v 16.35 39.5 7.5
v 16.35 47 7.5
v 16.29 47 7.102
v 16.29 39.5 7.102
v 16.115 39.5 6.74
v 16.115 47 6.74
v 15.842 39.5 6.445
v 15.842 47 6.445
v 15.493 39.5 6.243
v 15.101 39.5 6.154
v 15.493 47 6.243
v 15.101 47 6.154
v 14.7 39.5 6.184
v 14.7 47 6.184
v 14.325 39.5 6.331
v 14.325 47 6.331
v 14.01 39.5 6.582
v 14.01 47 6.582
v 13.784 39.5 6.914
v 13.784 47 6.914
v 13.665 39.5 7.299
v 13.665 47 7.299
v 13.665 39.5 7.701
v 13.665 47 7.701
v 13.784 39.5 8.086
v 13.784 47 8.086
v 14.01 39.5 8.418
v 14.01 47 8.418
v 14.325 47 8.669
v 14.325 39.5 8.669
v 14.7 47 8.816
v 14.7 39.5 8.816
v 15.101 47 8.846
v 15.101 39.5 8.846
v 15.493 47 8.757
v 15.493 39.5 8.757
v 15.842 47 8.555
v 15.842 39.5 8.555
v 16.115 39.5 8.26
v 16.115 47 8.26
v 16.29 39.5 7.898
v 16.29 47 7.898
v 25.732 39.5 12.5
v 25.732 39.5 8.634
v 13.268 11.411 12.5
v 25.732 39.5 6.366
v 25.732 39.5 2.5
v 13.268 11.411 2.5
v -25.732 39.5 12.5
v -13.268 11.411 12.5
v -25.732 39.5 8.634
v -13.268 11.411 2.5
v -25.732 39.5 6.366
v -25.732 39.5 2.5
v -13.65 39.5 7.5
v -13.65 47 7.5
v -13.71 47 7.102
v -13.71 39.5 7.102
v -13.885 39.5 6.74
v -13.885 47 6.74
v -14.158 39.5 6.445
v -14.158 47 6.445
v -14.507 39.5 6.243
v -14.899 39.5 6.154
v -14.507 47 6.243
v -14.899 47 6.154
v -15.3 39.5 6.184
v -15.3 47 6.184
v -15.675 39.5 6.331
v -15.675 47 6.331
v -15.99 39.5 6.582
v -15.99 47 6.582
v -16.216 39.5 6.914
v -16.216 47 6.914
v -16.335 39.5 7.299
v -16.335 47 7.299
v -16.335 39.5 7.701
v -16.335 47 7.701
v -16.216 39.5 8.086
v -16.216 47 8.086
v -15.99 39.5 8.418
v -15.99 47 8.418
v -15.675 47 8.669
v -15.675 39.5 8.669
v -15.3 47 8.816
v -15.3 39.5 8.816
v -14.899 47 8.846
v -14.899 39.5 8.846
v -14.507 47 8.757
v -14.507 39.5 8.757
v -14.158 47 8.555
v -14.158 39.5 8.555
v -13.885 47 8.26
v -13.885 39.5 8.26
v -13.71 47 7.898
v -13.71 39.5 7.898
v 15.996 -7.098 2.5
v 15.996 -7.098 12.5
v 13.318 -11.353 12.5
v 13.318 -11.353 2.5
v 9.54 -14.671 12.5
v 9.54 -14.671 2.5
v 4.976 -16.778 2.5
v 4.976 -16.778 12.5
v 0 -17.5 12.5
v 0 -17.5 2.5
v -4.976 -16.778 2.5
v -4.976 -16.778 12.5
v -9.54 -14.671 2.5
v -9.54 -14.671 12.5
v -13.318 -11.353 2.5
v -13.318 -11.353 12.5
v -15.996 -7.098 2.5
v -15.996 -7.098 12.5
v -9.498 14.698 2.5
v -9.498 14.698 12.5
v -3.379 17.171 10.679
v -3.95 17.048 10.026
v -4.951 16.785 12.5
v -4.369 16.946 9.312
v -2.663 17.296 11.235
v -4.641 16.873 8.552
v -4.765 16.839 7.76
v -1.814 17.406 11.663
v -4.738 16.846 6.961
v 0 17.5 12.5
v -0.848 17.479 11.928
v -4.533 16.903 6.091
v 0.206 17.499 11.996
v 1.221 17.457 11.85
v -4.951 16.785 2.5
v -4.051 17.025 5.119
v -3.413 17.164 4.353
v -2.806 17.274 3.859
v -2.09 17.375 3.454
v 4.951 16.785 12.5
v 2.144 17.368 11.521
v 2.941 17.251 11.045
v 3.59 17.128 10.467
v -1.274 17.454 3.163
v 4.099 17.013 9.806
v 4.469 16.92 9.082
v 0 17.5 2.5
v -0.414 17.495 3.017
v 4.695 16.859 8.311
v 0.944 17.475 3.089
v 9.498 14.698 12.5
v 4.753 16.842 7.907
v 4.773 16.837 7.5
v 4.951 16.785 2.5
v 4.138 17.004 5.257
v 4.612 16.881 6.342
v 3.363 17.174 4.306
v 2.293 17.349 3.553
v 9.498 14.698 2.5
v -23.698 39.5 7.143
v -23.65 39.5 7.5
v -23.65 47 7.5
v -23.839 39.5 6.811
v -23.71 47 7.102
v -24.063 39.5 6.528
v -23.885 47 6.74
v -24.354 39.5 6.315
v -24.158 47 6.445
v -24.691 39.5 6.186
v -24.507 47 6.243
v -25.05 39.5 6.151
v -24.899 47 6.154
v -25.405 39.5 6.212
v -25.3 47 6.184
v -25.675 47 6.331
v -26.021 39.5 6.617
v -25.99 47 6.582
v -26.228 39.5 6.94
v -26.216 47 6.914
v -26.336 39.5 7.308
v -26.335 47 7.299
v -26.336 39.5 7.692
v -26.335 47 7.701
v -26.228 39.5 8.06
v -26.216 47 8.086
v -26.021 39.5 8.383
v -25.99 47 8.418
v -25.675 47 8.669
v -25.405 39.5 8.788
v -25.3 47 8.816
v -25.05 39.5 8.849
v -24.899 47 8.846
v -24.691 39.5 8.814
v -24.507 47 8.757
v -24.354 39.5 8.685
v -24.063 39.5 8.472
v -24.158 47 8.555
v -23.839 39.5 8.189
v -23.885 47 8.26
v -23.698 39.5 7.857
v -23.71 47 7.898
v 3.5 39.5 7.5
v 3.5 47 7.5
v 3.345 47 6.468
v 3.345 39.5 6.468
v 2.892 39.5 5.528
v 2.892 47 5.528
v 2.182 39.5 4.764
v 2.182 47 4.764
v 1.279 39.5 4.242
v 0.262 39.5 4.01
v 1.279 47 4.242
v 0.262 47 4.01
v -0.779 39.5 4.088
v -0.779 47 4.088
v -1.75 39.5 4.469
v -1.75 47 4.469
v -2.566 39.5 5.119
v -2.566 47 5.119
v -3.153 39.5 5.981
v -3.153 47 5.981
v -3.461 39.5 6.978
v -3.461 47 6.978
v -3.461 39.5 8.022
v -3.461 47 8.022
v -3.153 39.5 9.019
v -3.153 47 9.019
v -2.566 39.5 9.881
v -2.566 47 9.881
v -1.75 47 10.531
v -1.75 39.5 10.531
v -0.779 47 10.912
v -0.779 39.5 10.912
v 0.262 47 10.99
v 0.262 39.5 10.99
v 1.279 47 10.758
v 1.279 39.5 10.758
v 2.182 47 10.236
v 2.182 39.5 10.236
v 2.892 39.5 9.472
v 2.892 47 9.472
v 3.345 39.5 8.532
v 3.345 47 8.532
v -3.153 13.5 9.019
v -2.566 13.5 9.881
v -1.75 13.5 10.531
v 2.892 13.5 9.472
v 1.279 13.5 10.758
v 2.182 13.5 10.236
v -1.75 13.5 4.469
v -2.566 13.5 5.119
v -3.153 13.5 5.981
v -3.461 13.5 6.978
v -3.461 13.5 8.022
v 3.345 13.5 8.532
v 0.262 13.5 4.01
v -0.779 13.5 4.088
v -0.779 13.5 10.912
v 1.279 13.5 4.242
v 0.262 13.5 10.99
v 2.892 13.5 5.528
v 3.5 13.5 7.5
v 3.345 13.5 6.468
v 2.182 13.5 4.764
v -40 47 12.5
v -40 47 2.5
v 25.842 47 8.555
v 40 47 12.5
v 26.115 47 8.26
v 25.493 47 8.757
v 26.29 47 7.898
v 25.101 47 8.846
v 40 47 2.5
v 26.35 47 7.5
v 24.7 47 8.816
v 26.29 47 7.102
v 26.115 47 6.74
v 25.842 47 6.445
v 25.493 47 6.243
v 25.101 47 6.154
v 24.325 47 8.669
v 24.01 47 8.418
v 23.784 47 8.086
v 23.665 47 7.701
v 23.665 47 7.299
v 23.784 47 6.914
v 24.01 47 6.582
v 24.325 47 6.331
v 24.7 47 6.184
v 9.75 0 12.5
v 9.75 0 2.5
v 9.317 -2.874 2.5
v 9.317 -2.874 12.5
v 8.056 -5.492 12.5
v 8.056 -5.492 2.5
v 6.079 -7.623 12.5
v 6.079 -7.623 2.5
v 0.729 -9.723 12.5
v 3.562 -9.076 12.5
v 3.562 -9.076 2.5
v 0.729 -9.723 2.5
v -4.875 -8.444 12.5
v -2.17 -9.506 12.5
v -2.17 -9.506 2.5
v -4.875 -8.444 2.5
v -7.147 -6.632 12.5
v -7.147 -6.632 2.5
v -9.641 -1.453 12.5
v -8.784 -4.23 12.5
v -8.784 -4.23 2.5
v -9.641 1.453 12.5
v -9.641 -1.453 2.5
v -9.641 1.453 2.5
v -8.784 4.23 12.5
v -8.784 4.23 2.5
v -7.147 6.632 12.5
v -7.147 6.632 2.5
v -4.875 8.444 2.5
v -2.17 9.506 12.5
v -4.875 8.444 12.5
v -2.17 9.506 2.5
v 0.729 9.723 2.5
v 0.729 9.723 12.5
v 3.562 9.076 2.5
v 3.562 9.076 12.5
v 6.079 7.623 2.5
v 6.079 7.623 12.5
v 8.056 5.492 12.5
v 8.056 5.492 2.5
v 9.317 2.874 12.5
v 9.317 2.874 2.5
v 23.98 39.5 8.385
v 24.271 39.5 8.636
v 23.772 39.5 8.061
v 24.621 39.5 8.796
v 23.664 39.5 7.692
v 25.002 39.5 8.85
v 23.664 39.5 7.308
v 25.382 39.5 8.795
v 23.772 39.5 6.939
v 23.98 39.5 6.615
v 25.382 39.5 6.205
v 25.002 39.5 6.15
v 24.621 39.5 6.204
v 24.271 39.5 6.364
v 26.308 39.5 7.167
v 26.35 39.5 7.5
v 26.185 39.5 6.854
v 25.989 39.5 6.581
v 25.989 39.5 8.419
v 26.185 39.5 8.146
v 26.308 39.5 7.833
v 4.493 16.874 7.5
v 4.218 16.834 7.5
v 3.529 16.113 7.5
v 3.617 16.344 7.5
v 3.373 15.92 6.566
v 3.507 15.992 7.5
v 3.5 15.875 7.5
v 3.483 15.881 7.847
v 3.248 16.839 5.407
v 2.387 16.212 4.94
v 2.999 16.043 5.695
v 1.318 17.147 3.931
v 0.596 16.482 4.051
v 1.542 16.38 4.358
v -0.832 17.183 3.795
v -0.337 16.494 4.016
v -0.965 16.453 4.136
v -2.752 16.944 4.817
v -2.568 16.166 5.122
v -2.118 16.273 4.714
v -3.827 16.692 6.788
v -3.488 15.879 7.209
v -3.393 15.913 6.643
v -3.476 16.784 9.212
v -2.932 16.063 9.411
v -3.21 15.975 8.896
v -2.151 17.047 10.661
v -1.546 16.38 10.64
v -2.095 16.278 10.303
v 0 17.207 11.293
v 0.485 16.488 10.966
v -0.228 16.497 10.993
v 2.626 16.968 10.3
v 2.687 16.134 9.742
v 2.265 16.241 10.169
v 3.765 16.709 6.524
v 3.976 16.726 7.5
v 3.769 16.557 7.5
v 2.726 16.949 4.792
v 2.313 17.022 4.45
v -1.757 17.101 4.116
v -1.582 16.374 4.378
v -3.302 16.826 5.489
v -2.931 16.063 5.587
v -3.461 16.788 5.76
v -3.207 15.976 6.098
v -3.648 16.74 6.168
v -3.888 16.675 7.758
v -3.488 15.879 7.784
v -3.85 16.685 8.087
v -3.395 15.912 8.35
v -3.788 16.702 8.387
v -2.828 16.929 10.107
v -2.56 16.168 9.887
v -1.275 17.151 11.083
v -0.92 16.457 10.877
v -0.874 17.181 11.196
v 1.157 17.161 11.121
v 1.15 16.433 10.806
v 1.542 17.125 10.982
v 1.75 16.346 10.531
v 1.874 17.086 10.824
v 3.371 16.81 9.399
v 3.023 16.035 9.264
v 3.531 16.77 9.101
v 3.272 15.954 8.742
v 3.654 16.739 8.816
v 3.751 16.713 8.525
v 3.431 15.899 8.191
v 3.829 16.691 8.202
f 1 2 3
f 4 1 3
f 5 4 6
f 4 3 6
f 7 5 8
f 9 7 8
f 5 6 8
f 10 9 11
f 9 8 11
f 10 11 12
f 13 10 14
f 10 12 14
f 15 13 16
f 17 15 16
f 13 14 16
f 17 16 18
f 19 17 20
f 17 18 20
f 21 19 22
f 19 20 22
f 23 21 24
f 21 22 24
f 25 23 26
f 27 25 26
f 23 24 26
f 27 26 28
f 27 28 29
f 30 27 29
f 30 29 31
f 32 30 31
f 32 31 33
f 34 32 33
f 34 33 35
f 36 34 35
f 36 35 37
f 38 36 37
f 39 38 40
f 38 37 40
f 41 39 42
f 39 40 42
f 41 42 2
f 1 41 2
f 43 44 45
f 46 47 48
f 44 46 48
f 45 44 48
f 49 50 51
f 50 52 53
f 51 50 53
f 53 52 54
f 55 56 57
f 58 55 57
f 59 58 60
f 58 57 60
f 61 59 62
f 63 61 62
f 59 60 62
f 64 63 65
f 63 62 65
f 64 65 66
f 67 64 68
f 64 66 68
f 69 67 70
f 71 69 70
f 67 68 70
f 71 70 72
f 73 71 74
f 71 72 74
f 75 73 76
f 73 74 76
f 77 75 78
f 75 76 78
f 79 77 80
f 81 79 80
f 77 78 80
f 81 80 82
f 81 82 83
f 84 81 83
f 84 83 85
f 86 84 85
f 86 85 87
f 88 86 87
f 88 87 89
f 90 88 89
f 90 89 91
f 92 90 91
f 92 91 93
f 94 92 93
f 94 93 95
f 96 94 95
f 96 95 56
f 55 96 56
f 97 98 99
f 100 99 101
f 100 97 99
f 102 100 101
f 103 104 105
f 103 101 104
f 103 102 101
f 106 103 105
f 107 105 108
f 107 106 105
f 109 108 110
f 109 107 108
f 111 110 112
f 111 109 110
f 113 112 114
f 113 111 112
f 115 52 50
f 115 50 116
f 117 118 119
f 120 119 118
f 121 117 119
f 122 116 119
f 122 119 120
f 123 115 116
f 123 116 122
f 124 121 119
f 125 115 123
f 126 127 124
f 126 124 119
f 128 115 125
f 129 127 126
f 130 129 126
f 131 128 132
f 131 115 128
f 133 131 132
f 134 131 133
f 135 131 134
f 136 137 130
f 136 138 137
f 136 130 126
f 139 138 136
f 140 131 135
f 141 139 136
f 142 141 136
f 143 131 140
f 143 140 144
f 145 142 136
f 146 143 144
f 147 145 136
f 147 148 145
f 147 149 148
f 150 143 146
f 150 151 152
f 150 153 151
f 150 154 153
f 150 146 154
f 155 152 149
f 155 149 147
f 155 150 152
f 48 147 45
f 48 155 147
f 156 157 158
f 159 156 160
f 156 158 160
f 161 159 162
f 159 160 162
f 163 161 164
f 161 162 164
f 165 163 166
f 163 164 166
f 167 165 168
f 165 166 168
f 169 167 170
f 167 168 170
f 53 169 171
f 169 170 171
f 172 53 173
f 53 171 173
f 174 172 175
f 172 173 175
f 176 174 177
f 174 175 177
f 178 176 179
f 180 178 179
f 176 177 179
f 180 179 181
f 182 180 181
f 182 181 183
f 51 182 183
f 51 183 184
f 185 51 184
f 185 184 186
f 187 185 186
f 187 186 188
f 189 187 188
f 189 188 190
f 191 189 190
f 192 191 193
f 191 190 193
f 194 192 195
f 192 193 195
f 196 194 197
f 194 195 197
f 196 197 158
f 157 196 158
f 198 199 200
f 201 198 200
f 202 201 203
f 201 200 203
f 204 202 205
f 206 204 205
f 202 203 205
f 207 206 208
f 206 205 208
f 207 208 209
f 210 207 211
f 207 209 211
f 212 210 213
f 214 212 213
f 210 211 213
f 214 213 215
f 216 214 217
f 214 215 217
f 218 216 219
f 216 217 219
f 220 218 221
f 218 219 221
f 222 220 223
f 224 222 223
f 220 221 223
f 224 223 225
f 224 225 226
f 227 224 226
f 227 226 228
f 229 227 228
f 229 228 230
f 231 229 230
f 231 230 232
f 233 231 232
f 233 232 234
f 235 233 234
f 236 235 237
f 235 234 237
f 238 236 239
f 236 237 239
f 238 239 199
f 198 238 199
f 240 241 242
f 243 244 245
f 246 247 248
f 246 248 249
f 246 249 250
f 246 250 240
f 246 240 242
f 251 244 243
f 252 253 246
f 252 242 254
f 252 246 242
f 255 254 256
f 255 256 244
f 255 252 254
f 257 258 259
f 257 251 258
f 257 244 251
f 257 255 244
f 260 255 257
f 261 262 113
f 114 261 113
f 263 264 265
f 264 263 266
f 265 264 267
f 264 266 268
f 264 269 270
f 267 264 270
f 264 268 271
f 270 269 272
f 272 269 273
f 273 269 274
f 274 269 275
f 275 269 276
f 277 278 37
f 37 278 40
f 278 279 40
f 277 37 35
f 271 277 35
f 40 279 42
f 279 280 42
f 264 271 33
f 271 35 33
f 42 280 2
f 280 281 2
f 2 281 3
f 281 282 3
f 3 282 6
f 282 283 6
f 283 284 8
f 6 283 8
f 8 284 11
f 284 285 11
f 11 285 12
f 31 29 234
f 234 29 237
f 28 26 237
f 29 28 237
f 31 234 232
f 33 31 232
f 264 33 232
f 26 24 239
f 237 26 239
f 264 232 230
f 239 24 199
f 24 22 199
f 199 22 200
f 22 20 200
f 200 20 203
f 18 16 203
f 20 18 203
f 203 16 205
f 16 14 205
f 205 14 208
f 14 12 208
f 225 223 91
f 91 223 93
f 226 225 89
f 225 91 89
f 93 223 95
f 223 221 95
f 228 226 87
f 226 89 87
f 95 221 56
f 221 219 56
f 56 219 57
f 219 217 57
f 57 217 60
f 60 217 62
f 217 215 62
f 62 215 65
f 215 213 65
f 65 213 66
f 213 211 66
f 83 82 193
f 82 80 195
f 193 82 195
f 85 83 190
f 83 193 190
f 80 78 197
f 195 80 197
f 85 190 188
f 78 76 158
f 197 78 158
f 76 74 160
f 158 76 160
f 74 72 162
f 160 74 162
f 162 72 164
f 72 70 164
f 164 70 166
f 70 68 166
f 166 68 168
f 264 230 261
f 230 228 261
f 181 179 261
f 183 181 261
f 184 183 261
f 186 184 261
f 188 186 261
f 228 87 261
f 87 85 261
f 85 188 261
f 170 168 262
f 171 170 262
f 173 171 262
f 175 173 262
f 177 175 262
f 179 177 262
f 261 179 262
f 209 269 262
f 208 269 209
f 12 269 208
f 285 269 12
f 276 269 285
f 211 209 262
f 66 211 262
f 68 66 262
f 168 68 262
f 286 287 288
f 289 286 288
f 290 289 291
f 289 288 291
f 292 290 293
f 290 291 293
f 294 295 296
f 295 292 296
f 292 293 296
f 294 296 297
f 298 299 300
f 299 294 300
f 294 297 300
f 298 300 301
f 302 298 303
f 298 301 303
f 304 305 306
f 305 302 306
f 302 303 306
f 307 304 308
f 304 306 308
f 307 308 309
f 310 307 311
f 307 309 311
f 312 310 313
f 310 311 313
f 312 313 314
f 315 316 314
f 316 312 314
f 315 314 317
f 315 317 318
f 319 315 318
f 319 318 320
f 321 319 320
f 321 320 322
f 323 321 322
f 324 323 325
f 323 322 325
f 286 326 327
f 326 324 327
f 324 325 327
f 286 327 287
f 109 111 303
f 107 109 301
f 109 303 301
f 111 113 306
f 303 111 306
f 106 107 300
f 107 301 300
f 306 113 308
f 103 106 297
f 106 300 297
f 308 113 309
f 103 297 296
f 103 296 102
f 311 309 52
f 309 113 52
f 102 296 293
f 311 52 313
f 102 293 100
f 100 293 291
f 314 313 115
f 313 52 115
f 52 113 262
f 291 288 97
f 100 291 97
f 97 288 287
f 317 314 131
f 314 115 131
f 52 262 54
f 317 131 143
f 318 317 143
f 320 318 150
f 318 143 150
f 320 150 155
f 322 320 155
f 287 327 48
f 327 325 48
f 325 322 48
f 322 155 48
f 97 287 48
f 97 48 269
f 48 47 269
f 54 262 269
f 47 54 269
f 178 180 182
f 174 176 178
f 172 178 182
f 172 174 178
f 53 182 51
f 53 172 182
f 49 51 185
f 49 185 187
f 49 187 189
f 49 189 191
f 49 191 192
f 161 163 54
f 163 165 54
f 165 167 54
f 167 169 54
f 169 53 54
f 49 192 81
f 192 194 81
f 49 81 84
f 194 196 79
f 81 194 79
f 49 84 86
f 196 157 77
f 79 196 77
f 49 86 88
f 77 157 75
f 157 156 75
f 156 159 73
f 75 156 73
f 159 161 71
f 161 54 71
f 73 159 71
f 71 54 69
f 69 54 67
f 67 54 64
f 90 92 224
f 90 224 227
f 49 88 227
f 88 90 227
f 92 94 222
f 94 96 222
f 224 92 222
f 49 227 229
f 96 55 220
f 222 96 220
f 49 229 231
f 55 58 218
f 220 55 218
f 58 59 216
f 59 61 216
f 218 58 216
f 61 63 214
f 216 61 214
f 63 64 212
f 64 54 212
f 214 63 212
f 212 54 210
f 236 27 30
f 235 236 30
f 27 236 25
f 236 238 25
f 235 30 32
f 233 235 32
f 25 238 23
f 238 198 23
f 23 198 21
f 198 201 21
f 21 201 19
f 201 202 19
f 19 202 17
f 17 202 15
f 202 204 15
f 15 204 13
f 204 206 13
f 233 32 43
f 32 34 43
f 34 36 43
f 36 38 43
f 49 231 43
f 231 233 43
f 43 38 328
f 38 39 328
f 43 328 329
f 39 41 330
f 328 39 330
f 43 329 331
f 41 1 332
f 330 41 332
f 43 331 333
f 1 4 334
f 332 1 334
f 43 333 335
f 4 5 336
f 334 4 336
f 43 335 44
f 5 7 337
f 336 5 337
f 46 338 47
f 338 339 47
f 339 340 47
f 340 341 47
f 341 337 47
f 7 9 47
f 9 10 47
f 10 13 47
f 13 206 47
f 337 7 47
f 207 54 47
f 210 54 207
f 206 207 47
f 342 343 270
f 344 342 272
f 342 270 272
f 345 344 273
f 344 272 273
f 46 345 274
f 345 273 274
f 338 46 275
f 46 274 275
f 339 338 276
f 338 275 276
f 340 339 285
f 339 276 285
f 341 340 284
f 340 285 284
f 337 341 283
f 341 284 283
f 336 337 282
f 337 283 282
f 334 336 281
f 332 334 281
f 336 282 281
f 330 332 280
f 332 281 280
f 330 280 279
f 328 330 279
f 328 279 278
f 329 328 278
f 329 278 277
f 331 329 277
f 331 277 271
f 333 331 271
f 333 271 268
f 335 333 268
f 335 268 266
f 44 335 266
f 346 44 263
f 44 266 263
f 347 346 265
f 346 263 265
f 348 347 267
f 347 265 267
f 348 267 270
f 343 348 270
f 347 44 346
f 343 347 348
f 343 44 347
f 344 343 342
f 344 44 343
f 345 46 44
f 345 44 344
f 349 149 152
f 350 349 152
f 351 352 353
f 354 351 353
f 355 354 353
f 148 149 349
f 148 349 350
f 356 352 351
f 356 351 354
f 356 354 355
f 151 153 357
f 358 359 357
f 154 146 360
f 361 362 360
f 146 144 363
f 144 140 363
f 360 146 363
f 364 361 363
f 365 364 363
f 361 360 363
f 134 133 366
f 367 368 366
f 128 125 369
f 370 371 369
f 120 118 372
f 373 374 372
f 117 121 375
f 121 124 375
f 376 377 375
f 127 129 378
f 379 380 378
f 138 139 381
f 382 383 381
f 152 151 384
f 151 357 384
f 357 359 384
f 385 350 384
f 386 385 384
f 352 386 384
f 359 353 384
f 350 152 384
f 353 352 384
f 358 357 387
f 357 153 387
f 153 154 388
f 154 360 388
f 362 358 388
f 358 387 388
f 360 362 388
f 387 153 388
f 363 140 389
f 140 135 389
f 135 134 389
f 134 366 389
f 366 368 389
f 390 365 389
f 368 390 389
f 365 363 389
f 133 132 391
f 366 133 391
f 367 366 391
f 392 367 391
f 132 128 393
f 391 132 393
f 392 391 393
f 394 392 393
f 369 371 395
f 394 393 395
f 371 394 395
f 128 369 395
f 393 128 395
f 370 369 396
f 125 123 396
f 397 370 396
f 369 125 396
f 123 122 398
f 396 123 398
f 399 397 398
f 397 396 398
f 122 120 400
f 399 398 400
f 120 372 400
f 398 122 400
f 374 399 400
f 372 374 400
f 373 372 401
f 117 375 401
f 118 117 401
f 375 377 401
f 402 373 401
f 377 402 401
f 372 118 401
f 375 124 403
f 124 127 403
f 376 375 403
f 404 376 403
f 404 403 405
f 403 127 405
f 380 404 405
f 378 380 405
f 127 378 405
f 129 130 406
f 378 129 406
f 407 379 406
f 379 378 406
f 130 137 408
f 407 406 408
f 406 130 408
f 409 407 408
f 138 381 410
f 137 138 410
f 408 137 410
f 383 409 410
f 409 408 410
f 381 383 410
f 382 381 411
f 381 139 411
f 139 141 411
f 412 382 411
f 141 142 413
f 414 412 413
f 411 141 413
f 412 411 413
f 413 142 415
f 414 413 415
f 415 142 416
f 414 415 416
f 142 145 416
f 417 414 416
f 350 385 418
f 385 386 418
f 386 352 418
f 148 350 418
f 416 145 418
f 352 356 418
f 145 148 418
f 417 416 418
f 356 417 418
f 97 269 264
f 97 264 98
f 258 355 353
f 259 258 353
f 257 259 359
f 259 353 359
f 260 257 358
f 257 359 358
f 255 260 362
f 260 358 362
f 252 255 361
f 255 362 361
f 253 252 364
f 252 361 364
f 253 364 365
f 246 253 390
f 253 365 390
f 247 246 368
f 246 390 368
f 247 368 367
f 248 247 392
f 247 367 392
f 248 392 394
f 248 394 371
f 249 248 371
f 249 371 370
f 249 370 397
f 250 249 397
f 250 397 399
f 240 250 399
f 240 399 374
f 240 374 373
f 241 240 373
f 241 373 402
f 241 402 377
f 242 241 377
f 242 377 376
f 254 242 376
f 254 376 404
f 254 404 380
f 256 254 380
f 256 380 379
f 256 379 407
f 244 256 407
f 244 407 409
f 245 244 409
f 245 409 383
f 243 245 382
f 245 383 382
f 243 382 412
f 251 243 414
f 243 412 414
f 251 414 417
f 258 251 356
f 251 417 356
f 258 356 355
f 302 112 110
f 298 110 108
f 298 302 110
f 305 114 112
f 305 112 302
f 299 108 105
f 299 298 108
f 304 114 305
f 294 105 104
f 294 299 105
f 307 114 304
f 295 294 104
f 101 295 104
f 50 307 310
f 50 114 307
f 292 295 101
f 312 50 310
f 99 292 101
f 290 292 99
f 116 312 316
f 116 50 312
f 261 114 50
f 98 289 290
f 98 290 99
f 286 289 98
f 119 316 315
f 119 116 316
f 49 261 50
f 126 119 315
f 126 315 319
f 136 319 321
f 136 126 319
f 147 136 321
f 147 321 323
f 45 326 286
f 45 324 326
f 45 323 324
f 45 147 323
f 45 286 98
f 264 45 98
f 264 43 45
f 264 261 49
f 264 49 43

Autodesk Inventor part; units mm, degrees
ref_plane "YZ Plane" through (0, 0, 0) normal (1, 0, 0) x (0, 1, 0)
ref_plane "XZ Plane" through (0, 0, 0) normal (0, 1, 0) x (-1, 0, 0)
ref_plane "XY Plane" through (0, 0, 0) normal (0, 0, 1) x (1, 0, 0)
ref_plane "Work Plane1" through (0, 0, 2.5) normal (0, 0, 1) x (1, 0, 0)
sketch "Sketch1" plane through (0, 0, 2.5) normal (0, 0, 1) x (1, 0, 0)
  circle A0 centre (0, 0) radius 9.75
  circle A1 centre (0, 0) radius 17.5
  line L0 (0, 0) -> (0, 47) construction
  line L1 (40, 47) -> (-40, 47)
  line L2 (-40, 47) -> (-15.996, -7.0977)
  line L3 (40, 47) -> (15.996, -7.0977)
  line L4 (-25.7319, 39.5) -> (25.7319, 39.5)
  line L5 (25.7319, 39.5) -> (13.2683, 11.4107)
  line L6 (-13.2683, 11.4107) -> (-25.7319, 39.5)
  dimension "d0" = 19.5
  dimension "d1" = 35
  dimension "d2" = 47
  dimension "d3" = 80
  dimension "d4" = 7.5
  dimension "d6" = 10
  dimension "d7" = 10
extrude "Extrusion1" add sketch "Sketch1" along normal blind 10 contours A1 | A1 L5 L4 L6 L2 L1 L3
sketch "Sketch2" plane through (-40, 47, 2.5) normal (0, 1, 0) x (1, 0, 0)
  line L0 (0, 0) -> (0, -10) construction
  line L1 (0, -5) -> (80, -5) construction
  line L2 (80, 0) -> (80, -10) construction
  circle A0 centre (15, -5) radius 1.35
  circle A1 centre (25, -5) radius 1.35
  line L3 (40, -5) -> (40, 0) construction
  line L4 (24.004, 0) -> (55.996, 0) construction
  circle A2 centre (65, -5) radius 1.35
  circle A3 centre (55, -5) radius 1.35
  circle A4 centre (40, -5) radius 3.5
  point P0 (40, 2.5)
  dimension "d10" = 2.7
  dimension "d11" = 15
  dimension "d14" = 10
  dimension "d19" = 7
extrude "Extrusion2" cut sketch "Sketch2" against normal up to surface (7.5 mm away)
ref_plane "Work Plane2" through (-40, 17.5, 2.5) normal (0, 1, 0) x (1, 0, 0)
sketch "Sketch3" plane through (-40, 17.5, 2.5) normal (0, 1, 0) x (1, 0, 0)
  circle A0 centre (40, -5) radius 3.5 projected
  point P0 (40, 2.5)
extrude "Extrusion3" cut sketch "Sketch3" against normal blind 4
fillet "Fillet1" radius 1 3 edges at (2.669, 17.2953, 9.7641) (-3.4999, 17.1465, 7.4721) (2.6638, 17.2961, 5.2297)
properties part number "LowerWheelBracket"
